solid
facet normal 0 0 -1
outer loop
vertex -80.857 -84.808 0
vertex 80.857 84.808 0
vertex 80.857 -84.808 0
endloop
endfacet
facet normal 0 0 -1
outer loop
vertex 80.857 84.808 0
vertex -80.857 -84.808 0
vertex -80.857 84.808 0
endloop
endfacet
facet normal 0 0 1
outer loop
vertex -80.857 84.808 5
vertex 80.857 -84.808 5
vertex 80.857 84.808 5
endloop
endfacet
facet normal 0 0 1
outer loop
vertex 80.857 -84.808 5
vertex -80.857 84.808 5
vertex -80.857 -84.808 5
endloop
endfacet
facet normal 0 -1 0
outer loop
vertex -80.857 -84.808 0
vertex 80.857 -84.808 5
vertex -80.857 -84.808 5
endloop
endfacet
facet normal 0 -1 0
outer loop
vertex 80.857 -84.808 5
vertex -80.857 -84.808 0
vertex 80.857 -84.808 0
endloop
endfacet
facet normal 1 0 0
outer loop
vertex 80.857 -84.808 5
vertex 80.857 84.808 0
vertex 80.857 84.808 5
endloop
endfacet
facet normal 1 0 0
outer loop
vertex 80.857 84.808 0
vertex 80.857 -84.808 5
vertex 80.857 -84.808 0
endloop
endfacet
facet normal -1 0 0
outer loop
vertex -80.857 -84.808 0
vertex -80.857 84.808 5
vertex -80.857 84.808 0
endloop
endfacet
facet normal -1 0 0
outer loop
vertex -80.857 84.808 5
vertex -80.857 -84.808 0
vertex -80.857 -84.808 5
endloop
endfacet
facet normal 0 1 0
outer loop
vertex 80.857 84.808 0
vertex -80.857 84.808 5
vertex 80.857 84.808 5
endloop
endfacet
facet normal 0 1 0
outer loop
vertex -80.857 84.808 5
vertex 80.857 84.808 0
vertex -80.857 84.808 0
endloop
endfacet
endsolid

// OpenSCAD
// Module names are of the form poly_<inkscape-path-id>().  As a result,
// you can associate a polygon in this OpenSCAD program with the corresponding
// SVG element in the Inkscape document by looking for the XML element with
// the attribute id="inkscape-path-id".

// fudge value is used to ensure that subtracted solids are a tad taller
// in the z dimension than the polygon being subtracted from.  This helps
// keep the resulting .stl file manifold.
fudge = 0.1;

module poly_path10(h)
{
  scale([25.4/90, -25.4/90, 1]) union()
  {
    linear_extrude(height=h)
      polygon([[262.130000,-21.720000],[267.555156,-37.519512],[272.291250,-53.533594],[276.342969,-69.733066],[279.715000,-86.088750],[282.412031,-102.571465],[284.438750,-119.152031],[285.799844,-135.801270],[286.500000,-152.490000],[286.500000,300.500000],[-66.700000,300.500000],[-57.173359,298.895840],[-47.871250,296.482969],[-38.786641,293.362051],[-29.912500,289.633750],[-21.241797,285.398730],[-12.767500,280.757656],[3.620000,270.660000],[22.179434,257.763945],[40.555469,244.584063],[58.695957,231.076523],[76.548750,217.197500],[94.061699,202.903164],[111.182656,188.149688],[127.859473,172.893242],[144.040000,157.090000],[162.672715,137.589746],[171.668440,127.519397],[180.431094,117.238594],[188.946189,106.749607],[197.199238,96.054707],[205.175754,85.156165],[212.861250,74.056250],[220.241238,62.757234],[227.301230,51.261387],[234.026741,39.570979],[240.403281,27.688281],[246.416365,15.615564],[252.051504,3.355098],[257.294211,-9.090847],[262.130000,-21.720000]]);
  }
}

module poly_path2(h)
{
  scale([25.4/90, -25.4/90, 1]) union()
  {
    linear_extrude(height=h)
      polygon([[-286.500000,-300.500000],[143.580000,-300.500000],[127.528145,-299.819258],[111.489531,-298.789062],[95.478340,-297.386211],[79.508750,-295.587500],[63.594941,-293.369727],[47.751094,-290.709687],[31.991387,-287.584180],[16.330000,-283.970000],[1.338965,-280.047383],[-13.527031,-275.651563],[-28.242324,-270.770586],[-42.781250,-265.392500],[-57.118145,-259.505352],[-71.227344,-253.097188],[-85.083184,-246.156055],[-98.660000,-238.670000],[-111.177598,-231.111953],[-123.386406,-223.061250],[-135.261699,-214.526797],[-146.778750,-205.517500],[-157.912832,-196.042266],[-168.639219,-186.110000],[-178.933184,-175.729609],[-188.770000,-164.910000],[-200.289082,-151.009824],[-211.058281,-136.536719],[-221.080527,-121.539316],[-230.358750,-106.066250],[-238.895879,-90.166152],[-246.694844,-73.887656],[-253.758574,-57.279395],[-260.090000,-40.390000],[-264.338281,-27.813125],[-268.216250,-15.120000],[-275.120000,10.510000],[-279.022969,27.367812],[-282.351250,44.355000],[-284.908906,61.469687],[-286.500000,78.710000],[-286.500000,-300.500000]]);
  }
}

module poly_path4(h)
{
  scale([25.4/90, -25.4/90, 1]) union()
  {
    linear_extrude(height=h)
      polygon([[143.580000,-300.500000],[179.590000,-300.500000],[201.525937,-299.477031],[223.430000,-297.888750],[245.259063,-295.548594],[266.970000,-292.270000],[271.117910,-277.033672],[274.807031,-261.678750],[278.022949,-246.218828],[280.751250,-230.667500],[282.977520,-215.038359],[284.687344,-199.345000],[285.866309,-183.601016],[286.500000,-167.820000],[286.500000,-152.490000],[285.799844,-135.801270],[284.438750,-119.152031],[282.412031,-102.571465],[279.715000,-86.088750],[276.342969,-69.733066],[272.291250,-53.533594],[267.555156,-37.519512],[262.130000,-21.720000],[257.294211,-9.090847],[252.051504,3.355098],[246.416365,15.615564],[240.403281,27.688281],[234.026741,39.570979],[227.301230,51.261387],[220.241238,62.757234],[212.861250,74.056250],[205.175754,85.156165],[197.199238,96.054707],[188.946189,106.749607],[180.431094,117.238594],[171.668440,127.519397],[162.672715,137.589746],[144.040000,157.090000],[127.859473,172.893242],[111.182656,188.149688],[94.061699,202.903164],[76.548750,217.197500],[58.695957,231.076523],[40.555469,244.584063],[22.179434,257.763945],[3.620000,270.660000],[-12.767500,280.757656],[-21.241797,285.398730],[-29.912500,289.633750],[-38.786641,293.362051],[-47.871250,296.482969],[-57.173359,298.895840],[-66.700000,300.500000],[-81.610000,300.500000],[-86.822129,299.676270],[-91.906406,298.310781],[-96.818418,296.430840],[-101.513750,294.063750],[-105.947988,291.236816],[-110.076719,287.977344],[-113.855527,284.312637],[-117.240000,280.270000],[-121.637676,273.841543],[-125.344531,267.047344],[-128.418809,259.949160],[-130.918750,252.608750],[-132.902598,245.087871],[-134.428594,237.448281],[-135.554980,229.751738],[-136.340000,222.060000],[-139.910000,183.266250],[-142.218125,163.932656],[-143.734297,154.317363],[-145.580000,144.750000],[-147.421562,137.942656],[-149.737500,131.181250],[-151.235664,127.977441],[-153.047188,124.976719],[-155.236992,122.242949],[-157.870000,119.840000],[-159.619414,118.767715],[-161.472188,118.111094],[-163.397617,117.817988],[-165.365000,117.836250],[-169.302813,118.598281],[-173.040000,119.980000],[-200.825000,131.883750],[-214.943438,137.227656],[-222.146914,139.479785],[-229.480000,141.350000],[-237.195938,142.770469],[-245.030000,143.451250],[-248.949727,143.424902],[-252.849063,143.106406],[-256.711367,142.460020],[-260.520000,141.450000],[-265.850000,139.161094],[-270.670000,135.941250],[-274.830000,131.905781],[-278.180000,127.170000],[-280.171562,123.483711],[-281.814375,119.656563],[-283.146875,115.713633],[-284.207500,111.680000],[-285.666875,103.440938],[-286.500000,95.140000],[-286.500000,78.710000],[-284.908906,61.469687],[-282.351250,44.355000],[-279.022969,27.367812],[-275.120000,10.510000],[-268.216250,-15.120000],[-264.338281,-27.813125],[-260.090000,-40.390000],[-253.758574,-57.279395],[-246.694844,-73.887656],[-238.895879,-90.166152],[-230.358750,-106.066250],[-221.080527,-121.539316],[-211.058281,-136.536719],[-200.289082,-151.009824],[-188.770000,-164.910000],[-178.933184,-175.729609],[-168.639219,-186.110000],[-157.912832,-196.042266],[-146.778750,-205.517500],[-135.261699,-214.526797],[-123.386406,-223.061250],[-111.177598,-231.111953],[-98.660000,-238.670000],[-85.083184,-246.156055],[-71.227344,-253.097188],[-57.118145,-259.505352],[-42.781250,-265.392500],[-28.242324,-270.770586],[-13.527031,-275.651563],[1.338965,-280.047383],[16.330000,-283.970000],[31.991387,-287.584180],[47.751094,-290.709687],[63.594941,-293.369727],[79.508750,-295.587500],[95.478340,-297.386211],[111.489531,-298.789062],[127.528145,-299.819258],[143.580000,-300.500000]]);
  }
}

module poly_path12(h)
{
  scale([25.4/90, -25.4/90, 1]) union()
  {
    linear_extrude(height=h)
      polygon([[-286.500000,95.140000],[-285.666875,103.440938],[-284.207500,111.680000],[-283.146875,115.713633],[-281.814375,119.656563],[-280.171562,123.483711],[-278.180000,127.170000],[-274.830000,131.905781],[-270.670000,135.941250],[-265.850000,139.161094],[-260.520000,141.450000],[-256.711367,142.460020],[-252.849063,143.106406],[-248.949727,143.424902],[-245.030000,143.451250],[-237.195938,142.770469],[-229.480000,141.350000],[-222.146914,139.479785],[-214.943438,137.227656],[-200.825000,131.883750],[-173.040000,119.980000],[-169.302813,118.598281],[-165.365000,117.836250],[-163.397617,117.817988],[-161.472188,118.111094],[-159.619414,118.767715],[-157.870000,119.840000],[-155.236992,122.242949],[-153.047188,124.976719],[-151.235664,127.977441],[-149.737500,131.181250],[-147.421562,137.942656],[-145.580000,144.750000],[-143.734297,154.317363],[-142.218125,163.932656],[-139.910000,183.266250],[-136.340000,222.060000],[-135.554980,229.751738],[-134.428594,237.448281],[-132.902598,245.087871],[-130.918750,252.608750],[-128.418809,259.949160],[-125.344531,267.047344],[-121.637676,273.841543],[-117.240000,280.270000],[-113.855527,284.312637],[-110.076719,287.977344],[-105.947988,291.236816],[-101.513750,294.063750],[-96.818418,296.430840],[-91.906406,298.310781],[-86.822129,299.676270],[-81.610000,300.500000],[-286.500000,300.500000],[-286.500000,95.140000]]);
  }
}

module poly_path8(h)
{
  scale([25.4/90, -25.4/90, 1]) union()
  {
    linear_extrude(height=h)
      polygon([[-12.040000,-27.810000],[173.010000,-183.470000],[167.416719,-177.210313],[161.631250,-171.117500],[150.020000,-158.960000],[-1.860000,0.520000],[93.800000,95.190000],[98.332500,99.702500],[102.730000,104.350000],[-17.240000,21.700000],[-49.638750,102.315000],[-82.180000,182.870000],[-43.100000,9.430000],[-197.420000,51.420000],[-120.655000,17.790000],[-43.800000,-15.660000],[-76.190000,-137.750000],[-44.066250,-82.810000],[-12.040000,-27.810000]]);
  }
}

module poly_path6(h)
{
  scale([25.4/90, -25.4/90, 1]) union()
  {
    linear_extrude(height=h)
      polygon([[179.590000,-300.500000],[286.500000,-300.500000],[286.500000,-167.820000],[285.866309,-183.601016],[284.687344,-199.345000],[282.977520,-215.038359],[280.751250,-230.667500],[278.022949,-246.218828],[274.807031,-261.678750],[271.117910,-277.033672],[266.970000,-292.270000],[245.259063,-295.548594],[223.430000,-297.888750],[201.525937,-299.477031],[179.590000,-300.500000]]);
  }
}

poly_path10(5);
poly_path2(5);
poly_path4(5);
poly_path12(5);
poly_path8(5);
poly_path6(5);
